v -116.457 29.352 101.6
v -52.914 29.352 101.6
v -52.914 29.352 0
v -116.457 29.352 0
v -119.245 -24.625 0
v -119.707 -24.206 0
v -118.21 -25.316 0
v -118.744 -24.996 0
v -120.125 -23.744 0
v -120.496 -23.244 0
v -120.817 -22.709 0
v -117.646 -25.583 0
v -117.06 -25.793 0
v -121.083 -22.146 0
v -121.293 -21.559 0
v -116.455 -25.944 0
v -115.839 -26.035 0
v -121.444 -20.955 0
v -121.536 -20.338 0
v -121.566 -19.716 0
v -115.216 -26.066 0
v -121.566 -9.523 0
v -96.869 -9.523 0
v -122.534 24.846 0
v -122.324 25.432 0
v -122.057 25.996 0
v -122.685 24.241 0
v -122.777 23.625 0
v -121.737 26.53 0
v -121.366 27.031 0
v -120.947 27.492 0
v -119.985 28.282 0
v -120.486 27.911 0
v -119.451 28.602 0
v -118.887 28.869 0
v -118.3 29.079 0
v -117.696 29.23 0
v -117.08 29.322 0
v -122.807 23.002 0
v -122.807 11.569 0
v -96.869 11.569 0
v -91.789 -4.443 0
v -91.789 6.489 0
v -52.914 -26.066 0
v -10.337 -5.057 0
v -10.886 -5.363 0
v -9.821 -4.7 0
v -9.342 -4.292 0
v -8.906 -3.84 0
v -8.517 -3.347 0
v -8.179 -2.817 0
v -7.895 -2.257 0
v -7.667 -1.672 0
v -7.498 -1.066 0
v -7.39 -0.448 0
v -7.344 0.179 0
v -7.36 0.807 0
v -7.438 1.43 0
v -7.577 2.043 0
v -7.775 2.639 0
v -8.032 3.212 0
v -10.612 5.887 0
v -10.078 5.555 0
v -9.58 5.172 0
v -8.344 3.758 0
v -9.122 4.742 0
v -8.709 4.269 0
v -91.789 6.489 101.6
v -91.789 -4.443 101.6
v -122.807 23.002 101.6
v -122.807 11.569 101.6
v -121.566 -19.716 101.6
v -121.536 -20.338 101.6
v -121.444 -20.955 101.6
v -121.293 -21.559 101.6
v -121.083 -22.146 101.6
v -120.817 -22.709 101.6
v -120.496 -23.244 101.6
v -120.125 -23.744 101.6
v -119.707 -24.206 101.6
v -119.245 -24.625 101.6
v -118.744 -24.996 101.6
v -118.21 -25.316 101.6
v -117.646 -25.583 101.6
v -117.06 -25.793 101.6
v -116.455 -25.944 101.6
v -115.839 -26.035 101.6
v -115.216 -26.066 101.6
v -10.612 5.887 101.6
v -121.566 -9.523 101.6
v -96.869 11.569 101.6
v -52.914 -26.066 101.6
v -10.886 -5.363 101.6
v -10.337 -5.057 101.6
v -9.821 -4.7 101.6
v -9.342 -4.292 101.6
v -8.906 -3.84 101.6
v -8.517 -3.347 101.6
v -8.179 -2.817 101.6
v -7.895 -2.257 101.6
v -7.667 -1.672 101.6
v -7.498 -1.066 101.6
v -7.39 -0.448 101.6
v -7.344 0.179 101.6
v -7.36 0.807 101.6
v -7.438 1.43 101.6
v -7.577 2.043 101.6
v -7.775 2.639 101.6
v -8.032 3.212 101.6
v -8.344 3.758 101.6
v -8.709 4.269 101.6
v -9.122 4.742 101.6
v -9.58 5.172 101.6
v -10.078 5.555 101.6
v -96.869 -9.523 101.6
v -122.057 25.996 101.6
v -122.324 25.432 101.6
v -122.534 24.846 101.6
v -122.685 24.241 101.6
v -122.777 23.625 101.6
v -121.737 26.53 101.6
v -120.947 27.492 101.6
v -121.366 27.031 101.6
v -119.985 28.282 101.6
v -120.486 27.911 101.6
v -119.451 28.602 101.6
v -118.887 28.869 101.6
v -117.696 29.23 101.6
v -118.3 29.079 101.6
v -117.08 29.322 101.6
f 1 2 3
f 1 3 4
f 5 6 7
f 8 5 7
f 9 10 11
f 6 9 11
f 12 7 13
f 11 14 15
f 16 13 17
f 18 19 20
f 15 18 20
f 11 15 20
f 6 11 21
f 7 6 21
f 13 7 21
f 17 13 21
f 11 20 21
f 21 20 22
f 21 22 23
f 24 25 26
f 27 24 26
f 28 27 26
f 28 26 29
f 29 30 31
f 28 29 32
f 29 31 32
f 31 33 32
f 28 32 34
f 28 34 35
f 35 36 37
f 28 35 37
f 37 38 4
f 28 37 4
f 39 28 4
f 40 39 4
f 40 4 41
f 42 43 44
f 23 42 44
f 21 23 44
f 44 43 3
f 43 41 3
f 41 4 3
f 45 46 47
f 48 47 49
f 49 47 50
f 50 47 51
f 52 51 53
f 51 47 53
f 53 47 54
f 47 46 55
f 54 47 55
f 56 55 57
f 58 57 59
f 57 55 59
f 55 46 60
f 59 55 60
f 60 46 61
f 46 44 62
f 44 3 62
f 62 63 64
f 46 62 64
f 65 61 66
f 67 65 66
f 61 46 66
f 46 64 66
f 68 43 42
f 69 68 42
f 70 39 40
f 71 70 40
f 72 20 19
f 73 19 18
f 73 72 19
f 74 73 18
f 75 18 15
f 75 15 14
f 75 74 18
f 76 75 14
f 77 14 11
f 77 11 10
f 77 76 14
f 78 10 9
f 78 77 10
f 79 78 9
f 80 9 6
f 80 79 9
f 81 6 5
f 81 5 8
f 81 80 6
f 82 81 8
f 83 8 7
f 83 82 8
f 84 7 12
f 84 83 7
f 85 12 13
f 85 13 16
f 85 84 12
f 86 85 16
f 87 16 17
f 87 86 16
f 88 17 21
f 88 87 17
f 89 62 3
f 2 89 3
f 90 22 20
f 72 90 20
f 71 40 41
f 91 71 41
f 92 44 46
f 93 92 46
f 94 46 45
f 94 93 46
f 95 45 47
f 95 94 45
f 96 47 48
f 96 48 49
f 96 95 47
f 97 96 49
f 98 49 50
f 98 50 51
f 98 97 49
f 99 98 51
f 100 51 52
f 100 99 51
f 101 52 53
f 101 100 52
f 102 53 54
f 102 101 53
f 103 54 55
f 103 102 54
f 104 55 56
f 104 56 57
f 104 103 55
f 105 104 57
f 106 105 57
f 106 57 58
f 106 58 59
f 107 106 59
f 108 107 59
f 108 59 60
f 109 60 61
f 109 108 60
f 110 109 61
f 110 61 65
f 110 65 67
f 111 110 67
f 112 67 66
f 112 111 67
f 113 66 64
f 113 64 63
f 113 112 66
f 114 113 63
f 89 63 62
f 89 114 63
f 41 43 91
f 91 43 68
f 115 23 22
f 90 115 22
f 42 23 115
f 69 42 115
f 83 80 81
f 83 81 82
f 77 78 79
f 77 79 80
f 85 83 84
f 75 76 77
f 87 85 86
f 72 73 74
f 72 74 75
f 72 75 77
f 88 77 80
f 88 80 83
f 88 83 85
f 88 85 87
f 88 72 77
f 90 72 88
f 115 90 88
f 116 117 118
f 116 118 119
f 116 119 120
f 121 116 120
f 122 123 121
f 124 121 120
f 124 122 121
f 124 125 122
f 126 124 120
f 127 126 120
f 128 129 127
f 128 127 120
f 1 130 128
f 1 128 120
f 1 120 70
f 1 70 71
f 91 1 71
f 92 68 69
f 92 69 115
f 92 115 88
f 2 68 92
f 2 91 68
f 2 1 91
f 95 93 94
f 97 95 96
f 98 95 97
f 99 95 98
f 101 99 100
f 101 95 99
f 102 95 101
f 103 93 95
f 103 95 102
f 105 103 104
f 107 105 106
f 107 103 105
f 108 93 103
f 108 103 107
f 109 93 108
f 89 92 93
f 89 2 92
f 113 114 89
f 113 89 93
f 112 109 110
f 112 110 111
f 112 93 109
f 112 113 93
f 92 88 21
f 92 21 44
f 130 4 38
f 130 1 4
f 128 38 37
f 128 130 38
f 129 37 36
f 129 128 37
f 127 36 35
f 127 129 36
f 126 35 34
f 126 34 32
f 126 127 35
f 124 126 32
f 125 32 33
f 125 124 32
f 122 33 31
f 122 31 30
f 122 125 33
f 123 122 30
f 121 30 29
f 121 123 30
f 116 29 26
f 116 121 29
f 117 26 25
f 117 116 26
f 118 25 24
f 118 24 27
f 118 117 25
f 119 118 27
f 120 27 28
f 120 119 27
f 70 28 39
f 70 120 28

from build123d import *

# Parameters (mm, degrees)
F1_DEPTH = 101.6
F2_R     = 6.35
F3_SIZE2 = 5.08
F3_SIZE  = 5.08
F4_SIZE2 = 5.08
F4_SIZE  = 5.08
F5_R     = 6.35


with BuildPart() as f1:
    # F0 (on Top) → F1 (new body)
    with BuildSketch(Plane.XY):
        Polygon((-52.913923, 29.352266), (-122.807145, 29.352266), (-122.807145, 11.568784), (-91.789439, 11.568784), (-91.789439, -9.523253), (-121.566437, -9.523253), (-121.566437, -26.066026), (-52.913923, -26.066026), (0, 0), align=None)
    extrude(amount=F1_DEPTH)

    # F2
    f2_edges = [f1.edges().sort_by_distance(p)[0] for p in [
        (-121.566437, -26.066026, 50.8),
        (-122.807145, 29.352266, 50.8),
    ]]
    fillet(f2_edges, radius=F2_R)

    # F3
    f3_edges = [f1.edges().sort_by_distance(p)[0] for p in [
        (-91.789439, 11.568784, 50.8),
    ]]
    chamfer(f3_edges, length=F3_SIZE, length2=F3_SIZE2)

    # F4
    f4_edges = [f1.edges().sort_by_distance(p)[0] for p in [
        (-91.789439, -9.523253, 50.8),
    ]]
    chamfer(f4_edges, length=F4_SIZE, length2=F4_SIZE2)

    # F5
    f5_edges = [f1.edges().sort_by_distance(p)[0] for p in [
        (0, 0, 50.8),
    ]]
    fillet(f5_edges, radius=F5_R)


solid = f1.part
